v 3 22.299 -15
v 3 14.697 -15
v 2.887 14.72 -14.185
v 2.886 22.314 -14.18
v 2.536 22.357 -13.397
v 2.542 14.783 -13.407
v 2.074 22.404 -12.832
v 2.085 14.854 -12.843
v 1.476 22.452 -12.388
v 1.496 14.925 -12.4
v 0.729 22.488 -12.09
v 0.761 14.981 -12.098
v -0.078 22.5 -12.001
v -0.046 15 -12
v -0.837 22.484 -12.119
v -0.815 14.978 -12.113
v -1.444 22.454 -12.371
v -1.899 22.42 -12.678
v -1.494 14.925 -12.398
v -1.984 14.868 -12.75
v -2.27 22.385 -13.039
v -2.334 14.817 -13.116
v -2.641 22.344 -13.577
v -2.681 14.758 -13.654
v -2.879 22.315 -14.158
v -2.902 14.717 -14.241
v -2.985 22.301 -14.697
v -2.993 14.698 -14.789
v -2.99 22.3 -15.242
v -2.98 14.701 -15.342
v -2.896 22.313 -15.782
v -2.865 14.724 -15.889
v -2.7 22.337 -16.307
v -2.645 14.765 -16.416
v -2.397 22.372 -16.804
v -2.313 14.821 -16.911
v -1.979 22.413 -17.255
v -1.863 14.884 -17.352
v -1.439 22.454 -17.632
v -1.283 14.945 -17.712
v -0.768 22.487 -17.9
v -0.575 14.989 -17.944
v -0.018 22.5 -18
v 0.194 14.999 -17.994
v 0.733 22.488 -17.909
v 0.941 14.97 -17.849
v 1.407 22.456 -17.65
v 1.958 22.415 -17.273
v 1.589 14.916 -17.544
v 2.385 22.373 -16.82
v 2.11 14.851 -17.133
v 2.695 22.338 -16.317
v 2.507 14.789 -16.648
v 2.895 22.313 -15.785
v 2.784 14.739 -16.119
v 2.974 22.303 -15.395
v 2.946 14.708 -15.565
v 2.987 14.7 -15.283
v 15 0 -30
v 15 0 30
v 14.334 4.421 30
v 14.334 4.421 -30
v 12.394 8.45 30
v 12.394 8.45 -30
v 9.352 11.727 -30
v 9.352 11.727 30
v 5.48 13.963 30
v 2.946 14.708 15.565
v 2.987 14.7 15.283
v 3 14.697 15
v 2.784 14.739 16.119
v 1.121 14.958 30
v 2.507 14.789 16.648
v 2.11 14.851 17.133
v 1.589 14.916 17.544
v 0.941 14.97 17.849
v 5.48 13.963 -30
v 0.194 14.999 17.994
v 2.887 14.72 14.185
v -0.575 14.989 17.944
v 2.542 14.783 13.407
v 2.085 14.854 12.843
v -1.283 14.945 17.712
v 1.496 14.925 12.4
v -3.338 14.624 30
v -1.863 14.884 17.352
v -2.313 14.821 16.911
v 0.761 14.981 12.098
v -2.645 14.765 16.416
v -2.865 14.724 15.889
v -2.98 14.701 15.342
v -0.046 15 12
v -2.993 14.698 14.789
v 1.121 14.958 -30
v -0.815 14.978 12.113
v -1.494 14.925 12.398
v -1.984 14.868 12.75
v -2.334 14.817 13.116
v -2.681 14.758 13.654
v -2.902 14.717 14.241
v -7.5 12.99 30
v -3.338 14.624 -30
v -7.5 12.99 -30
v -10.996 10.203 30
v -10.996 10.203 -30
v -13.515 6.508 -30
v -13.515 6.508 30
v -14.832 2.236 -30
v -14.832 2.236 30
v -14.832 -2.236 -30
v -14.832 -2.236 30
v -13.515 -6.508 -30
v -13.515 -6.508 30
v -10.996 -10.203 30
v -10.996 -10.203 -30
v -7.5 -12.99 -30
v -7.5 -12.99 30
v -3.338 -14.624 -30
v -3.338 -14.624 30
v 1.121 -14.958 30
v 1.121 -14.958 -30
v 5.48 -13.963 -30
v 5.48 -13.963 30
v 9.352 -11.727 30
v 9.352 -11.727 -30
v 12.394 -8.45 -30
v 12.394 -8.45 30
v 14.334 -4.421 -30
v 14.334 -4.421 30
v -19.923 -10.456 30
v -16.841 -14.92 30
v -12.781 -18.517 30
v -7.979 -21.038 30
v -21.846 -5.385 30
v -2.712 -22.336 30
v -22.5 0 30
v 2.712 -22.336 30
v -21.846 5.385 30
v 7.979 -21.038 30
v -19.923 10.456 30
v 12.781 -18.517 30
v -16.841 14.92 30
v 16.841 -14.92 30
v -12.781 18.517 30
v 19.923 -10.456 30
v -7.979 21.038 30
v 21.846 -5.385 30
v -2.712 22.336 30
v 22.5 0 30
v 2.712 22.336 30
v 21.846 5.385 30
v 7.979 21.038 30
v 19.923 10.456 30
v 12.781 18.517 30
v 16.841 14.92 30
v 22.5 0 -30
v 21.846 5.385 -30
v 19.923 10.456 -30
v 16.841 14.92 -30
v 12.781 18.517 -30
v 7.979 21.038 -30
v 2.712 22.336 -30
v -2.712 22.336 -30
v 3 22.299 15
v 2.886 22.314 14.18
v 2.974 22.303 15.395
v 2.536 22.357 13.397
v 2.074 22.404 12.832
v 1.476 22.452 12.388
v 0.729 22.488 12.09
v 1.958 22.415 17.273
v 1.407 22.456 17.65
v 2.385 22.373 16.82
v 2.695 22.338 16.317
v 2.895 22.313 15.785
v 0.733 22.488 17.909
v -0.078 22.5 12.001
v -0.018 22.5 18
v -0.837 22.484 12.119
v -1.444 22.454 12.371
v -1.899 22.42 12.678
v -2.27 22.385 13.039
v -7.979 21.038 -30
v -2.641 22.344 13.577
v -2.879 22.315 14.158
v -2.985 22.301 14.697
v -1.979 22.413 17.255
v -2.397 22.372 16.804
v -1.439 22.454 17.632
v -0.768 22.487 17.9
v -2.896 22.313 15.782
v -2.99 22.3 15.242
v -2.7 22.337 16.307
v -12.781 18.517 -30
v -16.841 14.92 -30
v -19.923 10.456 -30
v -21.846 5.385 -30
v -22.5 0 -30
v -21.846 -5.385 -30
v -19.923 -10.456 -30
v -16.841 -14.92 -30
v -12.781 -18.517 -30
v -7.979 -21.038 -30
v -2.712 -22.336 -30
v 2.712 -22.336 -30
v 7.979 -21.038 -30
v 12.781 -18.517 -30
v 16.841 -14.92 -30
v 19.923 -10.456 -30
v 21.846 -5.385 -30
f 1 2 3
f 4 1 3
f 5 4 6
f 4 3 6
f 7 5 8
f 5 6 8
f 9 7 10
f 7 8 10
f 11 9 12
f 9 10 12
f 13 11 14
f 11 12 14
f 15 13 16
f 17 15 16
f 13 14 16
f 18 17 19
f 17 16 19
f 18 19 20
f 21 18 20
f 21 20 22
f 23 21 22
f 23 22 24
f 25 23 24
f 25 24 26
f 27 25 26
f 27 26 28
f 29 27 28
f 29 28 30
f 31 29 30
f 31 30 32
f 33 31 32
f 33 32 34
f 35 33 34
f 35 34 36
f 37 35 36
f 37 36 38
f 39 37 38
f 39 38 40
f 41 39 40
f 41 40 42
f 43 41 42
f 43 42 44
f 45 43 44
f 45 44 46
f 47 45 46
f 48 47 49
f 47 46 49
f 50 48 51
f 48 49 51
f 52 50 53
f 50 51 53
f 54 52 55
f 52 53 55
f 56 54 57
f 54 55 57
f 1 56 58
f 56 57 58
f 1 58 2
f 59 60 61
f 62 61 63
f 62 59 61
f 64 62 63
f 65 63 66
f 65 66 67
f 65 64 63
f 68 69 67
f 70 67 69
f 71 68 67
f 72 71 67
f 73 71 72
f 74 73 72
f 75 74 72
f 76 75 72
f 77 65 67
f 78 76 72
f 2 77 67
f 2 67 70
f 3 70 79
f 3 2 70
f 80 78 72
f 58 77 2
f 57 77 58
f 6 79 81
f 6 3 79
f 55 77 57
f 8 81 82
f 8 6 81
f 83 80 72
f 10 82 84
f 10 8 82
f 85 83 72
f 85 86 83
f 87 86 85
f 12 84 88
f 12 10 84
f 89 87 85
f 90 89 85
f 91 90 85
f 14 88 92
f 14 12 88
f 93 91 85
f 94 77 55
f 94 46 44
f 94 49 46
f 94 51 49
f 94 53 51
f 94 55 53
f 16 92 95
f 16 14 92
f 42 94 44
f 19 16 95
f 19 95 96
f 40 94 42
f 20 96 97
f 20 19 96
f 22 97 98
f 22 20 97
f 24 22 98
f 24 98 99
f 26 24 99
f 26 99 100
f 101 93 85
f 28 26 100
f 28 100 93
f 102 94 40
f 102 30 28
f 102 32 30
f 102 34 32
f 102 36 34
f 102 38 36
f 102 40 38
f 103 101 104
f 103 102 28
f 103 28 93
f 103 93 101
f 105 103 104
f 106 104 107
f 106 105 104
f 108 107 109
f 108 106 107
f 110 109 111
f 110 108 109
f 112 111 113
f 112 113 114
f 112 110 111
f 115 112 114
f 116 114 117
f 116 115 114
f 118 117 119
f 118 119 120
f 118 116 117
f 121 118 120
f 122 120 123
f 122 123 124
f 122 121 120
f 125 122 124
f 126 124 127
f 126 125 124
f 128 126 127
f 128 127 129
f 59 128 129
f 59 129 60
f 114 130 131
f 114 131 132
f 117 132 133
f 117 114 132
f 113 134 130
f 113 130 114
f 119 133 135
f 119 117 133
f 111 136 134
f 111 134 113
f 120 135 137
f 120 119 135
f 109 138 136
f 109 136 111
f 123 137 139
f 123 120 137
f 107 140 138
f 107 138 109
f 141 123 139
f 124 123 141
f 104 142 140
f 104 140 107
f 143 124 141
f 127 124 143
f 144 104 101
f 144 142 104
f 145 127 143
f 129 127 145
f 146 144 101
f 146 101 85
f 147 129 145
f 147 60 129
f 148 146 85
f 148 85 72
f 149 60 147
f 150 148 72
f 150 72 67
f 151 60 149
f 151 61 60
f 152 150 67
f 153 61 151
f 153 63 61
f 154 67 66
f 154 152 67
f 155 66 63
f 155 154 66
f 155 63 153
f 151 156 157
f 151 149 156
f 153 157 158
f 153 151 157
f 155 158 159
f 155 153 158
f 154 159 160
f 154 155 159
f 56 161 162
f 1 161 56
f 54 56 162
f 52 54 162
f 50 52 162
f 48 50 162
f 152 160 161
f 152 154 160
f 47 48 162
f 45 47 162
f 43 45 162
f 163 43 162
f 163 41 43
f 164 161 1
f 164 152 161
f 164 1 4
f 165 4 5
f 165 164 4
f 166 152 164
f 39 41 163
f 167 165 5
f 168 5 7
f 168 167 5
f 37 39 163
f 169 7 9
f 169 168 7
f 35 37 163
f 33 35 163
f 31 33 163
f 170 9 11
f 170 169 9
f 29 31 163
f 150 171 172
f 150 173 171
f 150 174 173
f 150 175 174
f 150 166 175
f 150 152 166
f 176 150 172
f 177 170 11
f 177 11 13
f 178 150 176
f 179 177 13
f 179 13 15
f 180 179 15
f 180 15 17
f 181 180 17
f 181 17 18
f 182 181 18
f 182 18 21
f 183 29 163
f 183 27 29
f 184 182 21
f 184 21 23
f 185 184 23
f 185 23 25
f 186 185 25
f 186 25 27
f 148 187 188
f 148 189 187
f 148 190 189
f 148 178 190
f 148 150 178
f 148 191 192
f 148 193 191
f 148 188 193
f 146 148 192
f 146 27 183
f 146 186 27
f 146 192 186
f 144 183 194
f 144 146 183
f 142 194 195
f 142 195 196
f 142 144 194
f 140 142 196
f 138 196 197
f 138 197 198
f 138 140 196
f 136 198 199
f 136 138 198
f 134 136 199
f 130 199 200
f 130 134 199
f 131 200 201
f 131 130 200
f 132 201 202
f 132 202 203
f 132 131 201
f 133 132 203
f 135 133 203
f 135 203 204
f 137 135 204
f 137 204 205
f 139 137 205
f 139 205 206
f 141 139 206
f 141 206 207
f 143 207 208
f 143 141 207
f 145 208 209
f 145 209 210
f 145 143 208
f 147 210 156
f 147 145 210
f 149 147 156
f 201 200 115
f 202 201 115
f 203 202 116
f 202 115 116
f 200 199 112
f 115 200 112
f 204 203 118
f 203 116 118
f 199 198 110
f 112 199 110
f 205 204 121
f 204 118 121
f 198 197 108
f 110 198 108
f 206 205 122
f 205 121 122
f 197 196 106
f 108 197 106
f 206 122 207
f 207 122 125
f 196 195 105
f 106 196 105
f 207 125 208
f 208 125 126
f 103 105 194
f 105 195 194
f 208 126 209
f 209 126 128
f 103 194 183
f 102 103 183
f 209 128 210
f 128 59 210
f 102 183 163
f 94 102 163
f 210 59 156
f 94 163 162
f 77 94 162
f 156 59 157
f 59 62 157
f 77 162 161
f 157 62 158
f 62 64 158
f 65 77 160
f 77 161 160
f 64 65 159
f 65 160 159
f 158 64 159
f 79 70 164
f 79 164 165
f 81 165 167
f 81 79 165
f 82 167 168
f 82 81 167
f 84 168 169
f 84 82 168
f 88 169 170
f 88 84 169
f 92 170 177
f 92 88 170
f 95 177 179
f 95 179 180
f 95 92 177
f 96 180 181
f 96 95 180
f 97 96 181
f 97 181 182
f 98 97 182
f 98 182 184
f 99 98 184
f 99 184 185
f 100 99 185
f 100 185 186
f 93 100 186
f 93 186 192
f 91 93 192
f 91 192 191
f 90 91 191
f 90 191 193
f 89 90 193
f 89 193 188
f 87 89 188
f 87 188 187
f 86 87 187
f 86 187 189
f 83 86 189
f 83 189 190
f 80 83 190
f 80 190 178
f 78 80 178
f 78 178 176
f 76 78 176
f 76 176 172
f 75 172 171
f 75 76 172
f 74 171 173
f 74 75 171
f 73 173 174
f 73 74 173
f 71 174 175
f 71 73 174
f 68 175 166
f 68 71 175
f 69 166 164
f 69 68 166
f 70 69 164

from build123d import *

# Parameters (mm, degrees)
BOSS_EXTRUDE1_DEPTH      = 30
BOSS_EXTRUDE1_DEPTH_BACK = 30
SKETCH1_R                = 22.5
SKETCH1_R_2              = 15
SKETCH2_R                = 3
CUT_EXTRUDE1_DEPTH       = 30


with BuildPart() as part:
    # Sketch1 → Boss-Extrude1 (new, two sides: drawn at the far end of the back side and taken through both)
    with BuildSketch(Plane.XY.offset(-BOSS_EXTRUDE1_DEPTH_BACK)):
        Circle(SKETCH1_R)
        Circle(SKETCH1_R_2, mode=Mode.SUBTRACT)
    extrude(amount=BOSS_EXTRUDE1_DEPTH + BOSS_EXTRUDE1_DEPTH_BACK)

    # Sketch2 → Cut-Extrude1 (cut)
    with BuildSketch(Plane(origin=(0, 0, 0), x_dir=(1, 0, 0), z_dir=(0, 1, 0))):
        with Locations((0, -15)):
            Circle(SKETCH2_R)
    cut_extrude1 = extrude(amount=CUT_EXTRUDE1_DEPTH, mode=Mode.SUBTRACT)

    # Mirror1: Cut-Extrude1 across plane
    add(cut_extrude1.mirror(Plane.XY), mode=Mode.SUBTRACT)


solid = part.part
